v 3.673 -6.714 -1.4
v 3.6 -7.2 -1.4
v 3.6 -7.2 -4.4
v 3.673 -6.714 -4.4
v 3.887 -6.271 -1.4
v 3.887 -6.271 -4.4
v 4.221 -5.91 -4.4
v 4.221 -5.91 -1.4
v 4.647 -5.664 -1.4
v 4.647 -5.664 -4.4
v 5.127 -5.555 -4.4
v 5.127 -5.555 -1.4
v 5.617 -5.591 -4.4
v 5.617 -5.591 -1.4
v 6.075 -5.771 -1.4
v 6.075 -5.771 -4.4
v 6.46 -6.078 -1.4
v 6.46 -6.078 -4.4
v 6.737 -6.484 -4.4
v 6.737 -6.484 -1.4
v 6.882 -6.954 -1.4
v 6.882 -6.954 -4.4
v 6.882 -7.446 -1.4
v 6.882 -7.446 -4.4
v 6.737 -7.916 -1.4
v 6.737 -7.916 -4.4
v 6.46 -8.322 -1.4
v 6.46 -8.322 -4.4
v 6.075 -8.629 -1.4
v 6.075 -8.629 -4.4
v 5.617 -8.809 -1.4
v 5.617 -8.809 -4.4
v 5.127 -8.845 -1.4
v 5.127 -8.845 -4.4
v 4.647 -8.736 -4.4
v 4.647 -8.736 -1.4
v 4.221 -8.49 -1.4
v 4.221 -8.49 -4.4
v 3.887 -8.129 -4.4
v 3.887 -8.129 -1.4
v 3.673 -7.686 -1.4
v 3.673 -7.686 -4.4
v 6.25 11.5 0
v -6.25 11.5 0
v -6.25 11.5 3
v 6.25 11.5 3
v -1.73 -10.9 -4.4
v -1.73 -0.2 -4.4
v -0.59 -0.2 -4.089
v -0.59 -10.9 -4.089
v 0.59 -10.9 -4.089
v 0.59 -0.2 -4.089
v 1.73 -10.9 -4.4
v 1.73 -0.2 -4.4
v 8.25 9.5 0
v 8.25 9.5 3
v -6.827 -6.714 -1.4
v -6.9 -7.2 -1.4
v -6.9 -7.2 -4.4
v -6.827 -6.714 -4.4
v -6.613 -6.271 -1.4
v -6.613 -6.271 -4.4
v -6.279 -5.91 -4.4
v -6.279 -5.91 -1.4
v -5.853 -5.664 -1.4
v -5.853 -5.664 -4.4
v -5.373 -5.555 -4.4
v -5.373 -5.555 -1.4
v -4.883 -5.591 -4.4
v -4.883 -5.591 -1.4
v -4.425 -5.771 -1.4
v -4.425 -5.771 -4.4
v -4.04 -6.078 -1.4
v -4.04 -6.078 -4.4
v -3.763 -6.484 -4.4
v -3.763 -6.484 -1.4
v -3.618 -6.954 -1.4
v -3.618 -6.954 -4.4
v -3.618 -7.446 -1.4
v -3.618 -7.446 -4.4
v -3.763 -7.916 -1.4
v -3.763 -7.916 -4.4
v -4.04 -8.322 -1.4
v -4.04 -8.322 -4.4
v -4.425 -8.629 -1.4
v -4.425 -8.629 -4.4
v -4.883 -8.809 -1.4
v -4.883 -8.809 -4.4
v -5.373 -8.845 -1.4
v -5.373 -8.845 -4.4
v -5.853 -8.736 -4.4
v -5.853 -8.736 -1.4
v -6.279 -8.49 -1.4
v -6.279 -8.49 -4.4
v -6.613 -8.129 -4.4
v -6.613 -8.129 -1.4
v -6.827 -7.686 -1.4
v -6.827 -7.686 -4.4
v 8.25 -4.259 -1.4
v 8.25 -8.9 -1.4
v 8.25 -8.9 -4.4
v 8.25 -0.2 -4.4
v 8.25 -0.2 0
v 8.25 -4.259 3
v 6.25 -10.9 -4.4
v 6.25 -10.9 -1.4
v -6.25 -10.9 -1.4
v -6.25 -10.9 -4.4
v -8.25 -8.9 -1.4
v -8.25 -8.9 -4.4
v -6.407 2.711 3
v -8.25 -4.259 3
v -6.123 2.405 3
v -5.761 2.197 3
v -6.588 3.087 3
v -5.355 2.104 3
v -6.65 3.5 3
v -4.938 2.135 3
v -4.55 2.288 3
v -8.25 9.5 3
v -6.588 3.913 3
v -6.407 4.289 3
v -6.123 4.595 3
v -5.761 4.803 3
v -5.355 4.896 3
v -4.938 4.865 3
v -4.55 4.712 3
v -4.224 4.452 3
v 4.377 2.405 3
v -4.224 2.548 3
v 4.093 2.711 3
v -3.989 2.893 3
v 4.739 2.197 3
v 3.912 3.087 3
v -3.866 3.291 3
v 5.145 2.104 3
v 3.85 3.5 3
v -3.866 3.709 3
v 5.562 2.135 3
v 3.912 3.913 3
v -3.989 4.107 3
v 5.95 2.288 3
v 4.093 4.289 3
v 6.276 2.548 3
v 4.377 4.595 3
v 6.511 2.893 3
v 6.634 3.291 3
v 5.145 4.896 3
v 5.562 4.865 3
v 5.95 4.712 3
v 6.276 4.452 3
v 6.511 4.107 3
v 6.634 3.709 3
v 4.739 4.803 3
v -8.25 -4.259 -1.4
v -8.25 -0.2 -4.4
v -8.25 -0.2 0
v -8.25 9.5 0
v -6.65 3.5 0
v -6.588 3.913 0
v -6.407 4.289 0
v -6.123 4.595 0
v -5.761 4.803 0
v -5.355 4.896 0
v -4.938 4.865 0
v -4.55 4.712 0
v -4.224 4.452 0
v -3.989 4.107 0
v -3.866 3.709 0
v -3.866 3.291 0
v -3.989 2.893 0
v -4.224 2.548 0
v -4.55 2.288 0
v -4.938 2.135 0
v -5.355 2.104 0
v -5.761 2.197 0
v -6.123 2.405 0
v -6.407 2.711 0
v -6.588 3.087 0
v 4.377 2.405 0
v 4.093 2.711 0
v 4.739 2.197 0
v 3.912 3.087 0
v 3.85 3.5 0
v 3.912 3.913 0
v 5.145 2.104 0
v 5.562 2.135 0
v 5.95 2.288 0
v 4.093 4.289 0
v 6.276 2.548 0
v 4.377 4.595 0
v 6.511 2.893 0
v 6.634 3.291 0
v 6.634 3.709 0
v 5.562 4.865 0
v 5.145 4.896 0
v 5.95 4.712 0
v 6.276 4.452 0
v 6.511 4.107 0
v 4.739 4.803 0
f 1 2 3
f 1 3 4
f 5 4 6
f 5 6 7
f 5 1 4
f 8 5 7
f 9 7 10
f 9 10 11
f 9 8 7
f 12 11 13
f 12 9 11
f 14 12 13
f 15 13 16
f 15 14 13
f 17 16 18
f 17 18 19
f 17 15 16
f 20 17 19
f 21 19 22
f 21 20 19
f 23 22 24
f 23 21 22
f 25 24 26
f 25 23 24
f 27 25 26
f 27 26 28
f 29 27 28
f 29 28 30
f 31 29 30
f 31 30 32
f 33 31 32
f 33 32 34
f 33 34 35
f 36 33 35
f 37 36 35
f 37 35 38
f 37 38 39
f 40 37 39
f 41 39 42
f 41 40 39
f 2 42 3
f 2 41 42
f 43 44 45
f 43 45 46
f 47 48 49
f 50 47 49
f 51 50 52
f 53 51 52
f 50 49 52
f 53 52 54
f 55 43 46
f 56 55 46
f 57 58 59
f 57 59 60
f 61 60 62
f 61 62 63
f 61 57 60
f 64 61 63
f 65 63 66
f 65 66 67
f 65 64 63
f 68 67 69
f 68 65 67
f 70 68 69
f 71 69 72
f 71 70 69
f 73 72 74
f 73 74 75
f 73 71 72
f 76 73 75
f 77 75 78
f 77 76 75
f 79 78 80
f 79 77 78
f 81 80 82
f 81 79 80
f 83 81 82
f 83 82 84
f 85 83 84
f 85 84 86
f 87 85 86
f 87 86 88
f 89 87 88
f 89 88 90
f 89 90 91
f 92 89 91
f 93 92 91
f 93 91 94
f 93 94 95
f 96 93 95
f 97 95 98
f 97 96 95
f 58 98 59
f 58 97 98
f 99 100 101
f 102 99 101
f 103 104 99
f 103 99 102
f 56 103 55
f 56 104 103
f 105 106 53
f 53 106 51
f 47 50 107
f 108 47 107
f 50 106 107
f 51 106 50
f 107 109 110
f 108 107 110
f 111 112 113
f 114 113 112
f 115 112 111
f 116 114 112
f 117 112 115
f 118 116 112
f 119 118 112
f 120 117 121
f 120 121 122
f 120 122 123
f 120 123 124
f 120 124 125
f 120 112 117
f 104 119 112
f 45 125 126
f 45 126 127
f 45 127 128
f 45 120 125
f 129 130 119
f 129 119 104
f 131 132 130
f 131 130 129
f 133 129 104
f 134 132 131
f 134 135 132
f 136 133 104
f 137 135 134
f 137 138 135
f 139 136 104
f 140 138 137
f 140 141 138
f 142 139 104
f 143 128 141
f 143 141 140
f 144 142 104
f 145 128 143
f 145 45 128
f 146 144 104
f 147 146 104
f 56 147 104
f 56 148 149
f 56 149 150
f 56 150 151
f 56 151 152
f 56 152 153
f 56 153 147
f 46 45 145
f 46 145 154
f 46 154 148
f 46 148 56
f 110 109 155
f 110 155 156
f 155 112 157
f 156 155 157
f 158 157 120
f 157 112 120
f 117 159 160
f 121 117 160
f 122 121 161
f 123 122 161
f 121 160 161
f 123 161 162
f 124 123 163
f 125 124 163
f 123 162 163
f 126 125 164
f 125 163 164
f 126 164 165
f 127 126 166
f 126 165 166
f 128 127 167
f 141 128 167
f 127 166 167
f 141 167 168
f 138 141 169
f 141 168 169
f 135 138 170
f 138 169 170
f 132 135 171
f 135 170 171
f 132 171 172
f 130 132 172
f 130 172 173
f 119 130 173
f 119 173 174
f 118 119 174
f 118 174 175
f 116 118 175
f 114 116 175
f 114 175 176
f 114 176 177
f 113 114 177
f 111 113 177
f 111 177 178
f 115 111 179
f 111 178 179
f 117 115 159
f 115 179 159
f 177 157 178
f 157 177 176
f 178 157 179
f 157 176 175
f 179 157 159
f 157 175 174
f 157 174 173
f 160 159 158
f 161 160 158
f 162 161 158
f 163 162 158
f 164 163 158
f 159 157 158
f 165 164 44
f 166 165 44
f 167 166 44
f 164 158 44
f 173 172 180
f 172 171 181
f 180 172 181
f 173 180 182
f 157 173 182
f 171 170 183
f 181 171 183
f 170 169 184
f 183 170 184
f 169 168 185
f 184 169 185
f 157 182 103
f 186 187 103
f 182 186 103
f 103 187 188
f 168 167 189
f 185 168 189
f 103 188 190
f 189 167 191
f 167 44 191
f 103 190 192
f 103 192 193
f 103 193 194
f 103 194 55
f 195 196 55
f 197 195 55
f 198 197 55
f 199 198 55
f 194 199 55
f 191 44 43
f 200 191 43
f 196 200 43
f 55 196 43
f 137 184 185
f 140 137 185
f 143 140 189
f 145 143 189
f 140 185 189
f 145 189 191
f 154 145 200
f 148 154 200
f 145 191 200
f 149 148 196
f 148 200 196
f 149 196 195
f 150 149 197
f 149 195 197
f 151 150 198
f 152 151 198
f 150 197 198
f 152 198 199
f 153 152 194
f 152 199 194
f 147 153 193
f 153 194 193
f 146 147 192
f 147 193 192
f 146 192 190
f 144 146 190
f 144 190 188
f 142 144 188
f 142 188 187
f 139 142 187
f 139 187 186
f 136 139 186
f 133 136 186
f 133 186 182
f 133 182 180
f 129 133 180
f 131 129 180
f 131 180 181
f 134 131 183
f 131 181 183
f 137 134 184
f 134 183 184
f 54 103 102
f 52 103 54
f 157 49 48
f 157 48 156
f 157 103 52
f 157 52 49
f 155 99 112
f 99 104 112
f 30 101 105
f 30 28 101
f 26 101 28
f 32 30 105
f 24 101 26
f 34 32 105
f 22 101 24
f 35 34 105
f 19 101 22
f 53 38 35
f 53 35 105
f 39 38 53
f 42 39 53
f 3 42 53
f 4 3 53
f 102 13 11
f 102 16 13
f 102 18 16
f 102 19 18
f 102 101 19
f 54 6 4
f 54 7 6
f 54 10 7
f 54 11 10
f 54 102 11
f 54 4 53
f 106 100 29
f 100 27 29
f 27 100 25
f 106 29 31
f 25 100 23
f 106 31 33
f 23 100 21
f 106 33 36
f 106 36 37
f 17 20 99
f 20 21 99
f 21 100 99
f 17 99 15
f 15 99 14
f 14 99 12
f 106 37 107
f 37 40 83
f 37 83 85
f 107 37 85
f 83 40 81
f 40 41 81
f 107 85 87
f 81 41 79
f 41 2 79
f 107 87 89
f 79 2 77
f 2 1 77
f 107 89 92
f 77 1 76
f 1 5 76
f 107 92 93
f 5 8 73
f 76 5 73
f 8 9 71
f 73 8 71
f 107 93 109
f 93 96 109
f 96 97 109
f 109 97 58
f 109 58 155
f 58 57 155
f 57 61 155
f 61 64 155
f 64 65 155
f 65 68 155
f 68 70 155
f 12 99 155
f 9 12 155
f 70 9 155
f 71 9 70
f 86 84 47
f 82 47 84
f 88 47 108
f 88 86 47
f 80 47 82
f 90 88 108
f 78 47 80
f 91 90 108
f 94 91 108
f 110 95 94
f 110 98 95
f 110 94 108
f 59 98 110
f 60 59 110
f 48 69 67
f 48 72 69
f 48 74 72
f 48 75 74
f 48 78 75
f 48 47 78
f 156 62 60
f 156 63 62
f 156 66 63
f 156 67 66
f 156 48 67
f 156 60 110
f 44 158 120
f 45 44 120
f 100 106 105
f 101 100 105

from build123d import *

# Parameters (mm, degrees)
SKETCH2_W           = 16.5
SKETCH2_H           = 15.758588826
BOSS_EXTRUDE1_DEPTH = 3
SKETCH3_W           = 16.5
SKETCH3_H           = 4.058588826
BOSS_EXTRUDE2_DEPTH = 1.4
SKETCH4_W           = 16.5
SKETCH4_H           = 10.7
SKETCH4_R           = 1.65
BOSS_EXTRUDE3_DEPTH = 3
SKETCH5_R           = 1.4
CUT_EXTRUDE1_DEPTH  = 3
CHAMFER1_SIZE       = 2
SKETCH6_R           = 4.45
CUT_EXTRUDE2_DEPTH  = 17


with BuildPart() as part:
    # Sketch2 → Boss-Extrude1 (new body)
    with BuildSketch(Plane.XY):
        with Locations((0, 3.620705587)):
            Rectangle(SKETCH2_W, SKETCH2_H)
    extrude(amount=BOSS_EXTRUDE1_DEPTH)

    # Sketch3 → Boss-Extrude2 (add)
    with BuildSketch(Plane(origin=(0, 0, 0), x_dir=(-1, 0, 0), z_dir=(0, 0, -1))):
        with Locations((0, -2.229294413)):
            Rectangle(SKETCH3_W, SKETCH3_H)
    extrude(amount=BOSS_EXTRUDE2_DEPTH)

    # Sketch4 → Boss-Extrude3 (add)
    with BuildSketch(Plane(origin=(0, 0, -1.4), x_dir=(-1, 0, 0), z_dir=(0, 0, -1))):
        with Locations((0, -5.55)):
            Rectangle(SKETCH4_W, SKETCH4_H)
        with Locations((-5.25, -7.2)):
            Circle(SKETCH4_R, mode=Mode.SUBTRACT)
        with Locations((5.25, -7.2)):
            Circle(SKETCH4_R, mode=Mode.SUBTRACT)
    extrude(amount=BOSS_EXTRUDE3_DEPTH)

    # Sketch5 → Cut-Extrude1 (cut)
    with BuildSketch(Plane(origin=(0, 0, 0), x_dir=(-1, 0, 0), z_dir=(0, 0, -1))):
        with Locations((-5.25, 3.5)):
            Circle(SKETCH5_R)
        with Locations((5.25, 3.5)):
            Circle(SKETCH5_R)
    extrude(amount=-CUT_EXTRUDE1_DEPTH, mode=Mode.SUBTRACT)

    # Chamfer1
    chamfer1_edges = [part.edges().sort_by_distance(p)[0] for p in [
        (8.25, -10.9, -2.9),
        (-8.25, -10.9, -2.9),
        (-8.25, 11.5, 1.5),
        (8.25, 11.5, 1.5),
    ]]
    chamfer(chamfer1_edges, length=CHAMFER1_SIZE)

    # Sketch6 → Cut-Extrude2 (cut)
    with BuildSketch(Plane(origin=(0, -0.2, 0), x_dir=(1, 0, 0), z_dir=(0, 1, 0))):
        with Locations((0, 8.5)):
            Circle(SKETCH6_R)
    extrude(amount=-CUT_EXTRUDE2_DEPTH, mode=Mode.SUBTRACT)


solid = part.part
